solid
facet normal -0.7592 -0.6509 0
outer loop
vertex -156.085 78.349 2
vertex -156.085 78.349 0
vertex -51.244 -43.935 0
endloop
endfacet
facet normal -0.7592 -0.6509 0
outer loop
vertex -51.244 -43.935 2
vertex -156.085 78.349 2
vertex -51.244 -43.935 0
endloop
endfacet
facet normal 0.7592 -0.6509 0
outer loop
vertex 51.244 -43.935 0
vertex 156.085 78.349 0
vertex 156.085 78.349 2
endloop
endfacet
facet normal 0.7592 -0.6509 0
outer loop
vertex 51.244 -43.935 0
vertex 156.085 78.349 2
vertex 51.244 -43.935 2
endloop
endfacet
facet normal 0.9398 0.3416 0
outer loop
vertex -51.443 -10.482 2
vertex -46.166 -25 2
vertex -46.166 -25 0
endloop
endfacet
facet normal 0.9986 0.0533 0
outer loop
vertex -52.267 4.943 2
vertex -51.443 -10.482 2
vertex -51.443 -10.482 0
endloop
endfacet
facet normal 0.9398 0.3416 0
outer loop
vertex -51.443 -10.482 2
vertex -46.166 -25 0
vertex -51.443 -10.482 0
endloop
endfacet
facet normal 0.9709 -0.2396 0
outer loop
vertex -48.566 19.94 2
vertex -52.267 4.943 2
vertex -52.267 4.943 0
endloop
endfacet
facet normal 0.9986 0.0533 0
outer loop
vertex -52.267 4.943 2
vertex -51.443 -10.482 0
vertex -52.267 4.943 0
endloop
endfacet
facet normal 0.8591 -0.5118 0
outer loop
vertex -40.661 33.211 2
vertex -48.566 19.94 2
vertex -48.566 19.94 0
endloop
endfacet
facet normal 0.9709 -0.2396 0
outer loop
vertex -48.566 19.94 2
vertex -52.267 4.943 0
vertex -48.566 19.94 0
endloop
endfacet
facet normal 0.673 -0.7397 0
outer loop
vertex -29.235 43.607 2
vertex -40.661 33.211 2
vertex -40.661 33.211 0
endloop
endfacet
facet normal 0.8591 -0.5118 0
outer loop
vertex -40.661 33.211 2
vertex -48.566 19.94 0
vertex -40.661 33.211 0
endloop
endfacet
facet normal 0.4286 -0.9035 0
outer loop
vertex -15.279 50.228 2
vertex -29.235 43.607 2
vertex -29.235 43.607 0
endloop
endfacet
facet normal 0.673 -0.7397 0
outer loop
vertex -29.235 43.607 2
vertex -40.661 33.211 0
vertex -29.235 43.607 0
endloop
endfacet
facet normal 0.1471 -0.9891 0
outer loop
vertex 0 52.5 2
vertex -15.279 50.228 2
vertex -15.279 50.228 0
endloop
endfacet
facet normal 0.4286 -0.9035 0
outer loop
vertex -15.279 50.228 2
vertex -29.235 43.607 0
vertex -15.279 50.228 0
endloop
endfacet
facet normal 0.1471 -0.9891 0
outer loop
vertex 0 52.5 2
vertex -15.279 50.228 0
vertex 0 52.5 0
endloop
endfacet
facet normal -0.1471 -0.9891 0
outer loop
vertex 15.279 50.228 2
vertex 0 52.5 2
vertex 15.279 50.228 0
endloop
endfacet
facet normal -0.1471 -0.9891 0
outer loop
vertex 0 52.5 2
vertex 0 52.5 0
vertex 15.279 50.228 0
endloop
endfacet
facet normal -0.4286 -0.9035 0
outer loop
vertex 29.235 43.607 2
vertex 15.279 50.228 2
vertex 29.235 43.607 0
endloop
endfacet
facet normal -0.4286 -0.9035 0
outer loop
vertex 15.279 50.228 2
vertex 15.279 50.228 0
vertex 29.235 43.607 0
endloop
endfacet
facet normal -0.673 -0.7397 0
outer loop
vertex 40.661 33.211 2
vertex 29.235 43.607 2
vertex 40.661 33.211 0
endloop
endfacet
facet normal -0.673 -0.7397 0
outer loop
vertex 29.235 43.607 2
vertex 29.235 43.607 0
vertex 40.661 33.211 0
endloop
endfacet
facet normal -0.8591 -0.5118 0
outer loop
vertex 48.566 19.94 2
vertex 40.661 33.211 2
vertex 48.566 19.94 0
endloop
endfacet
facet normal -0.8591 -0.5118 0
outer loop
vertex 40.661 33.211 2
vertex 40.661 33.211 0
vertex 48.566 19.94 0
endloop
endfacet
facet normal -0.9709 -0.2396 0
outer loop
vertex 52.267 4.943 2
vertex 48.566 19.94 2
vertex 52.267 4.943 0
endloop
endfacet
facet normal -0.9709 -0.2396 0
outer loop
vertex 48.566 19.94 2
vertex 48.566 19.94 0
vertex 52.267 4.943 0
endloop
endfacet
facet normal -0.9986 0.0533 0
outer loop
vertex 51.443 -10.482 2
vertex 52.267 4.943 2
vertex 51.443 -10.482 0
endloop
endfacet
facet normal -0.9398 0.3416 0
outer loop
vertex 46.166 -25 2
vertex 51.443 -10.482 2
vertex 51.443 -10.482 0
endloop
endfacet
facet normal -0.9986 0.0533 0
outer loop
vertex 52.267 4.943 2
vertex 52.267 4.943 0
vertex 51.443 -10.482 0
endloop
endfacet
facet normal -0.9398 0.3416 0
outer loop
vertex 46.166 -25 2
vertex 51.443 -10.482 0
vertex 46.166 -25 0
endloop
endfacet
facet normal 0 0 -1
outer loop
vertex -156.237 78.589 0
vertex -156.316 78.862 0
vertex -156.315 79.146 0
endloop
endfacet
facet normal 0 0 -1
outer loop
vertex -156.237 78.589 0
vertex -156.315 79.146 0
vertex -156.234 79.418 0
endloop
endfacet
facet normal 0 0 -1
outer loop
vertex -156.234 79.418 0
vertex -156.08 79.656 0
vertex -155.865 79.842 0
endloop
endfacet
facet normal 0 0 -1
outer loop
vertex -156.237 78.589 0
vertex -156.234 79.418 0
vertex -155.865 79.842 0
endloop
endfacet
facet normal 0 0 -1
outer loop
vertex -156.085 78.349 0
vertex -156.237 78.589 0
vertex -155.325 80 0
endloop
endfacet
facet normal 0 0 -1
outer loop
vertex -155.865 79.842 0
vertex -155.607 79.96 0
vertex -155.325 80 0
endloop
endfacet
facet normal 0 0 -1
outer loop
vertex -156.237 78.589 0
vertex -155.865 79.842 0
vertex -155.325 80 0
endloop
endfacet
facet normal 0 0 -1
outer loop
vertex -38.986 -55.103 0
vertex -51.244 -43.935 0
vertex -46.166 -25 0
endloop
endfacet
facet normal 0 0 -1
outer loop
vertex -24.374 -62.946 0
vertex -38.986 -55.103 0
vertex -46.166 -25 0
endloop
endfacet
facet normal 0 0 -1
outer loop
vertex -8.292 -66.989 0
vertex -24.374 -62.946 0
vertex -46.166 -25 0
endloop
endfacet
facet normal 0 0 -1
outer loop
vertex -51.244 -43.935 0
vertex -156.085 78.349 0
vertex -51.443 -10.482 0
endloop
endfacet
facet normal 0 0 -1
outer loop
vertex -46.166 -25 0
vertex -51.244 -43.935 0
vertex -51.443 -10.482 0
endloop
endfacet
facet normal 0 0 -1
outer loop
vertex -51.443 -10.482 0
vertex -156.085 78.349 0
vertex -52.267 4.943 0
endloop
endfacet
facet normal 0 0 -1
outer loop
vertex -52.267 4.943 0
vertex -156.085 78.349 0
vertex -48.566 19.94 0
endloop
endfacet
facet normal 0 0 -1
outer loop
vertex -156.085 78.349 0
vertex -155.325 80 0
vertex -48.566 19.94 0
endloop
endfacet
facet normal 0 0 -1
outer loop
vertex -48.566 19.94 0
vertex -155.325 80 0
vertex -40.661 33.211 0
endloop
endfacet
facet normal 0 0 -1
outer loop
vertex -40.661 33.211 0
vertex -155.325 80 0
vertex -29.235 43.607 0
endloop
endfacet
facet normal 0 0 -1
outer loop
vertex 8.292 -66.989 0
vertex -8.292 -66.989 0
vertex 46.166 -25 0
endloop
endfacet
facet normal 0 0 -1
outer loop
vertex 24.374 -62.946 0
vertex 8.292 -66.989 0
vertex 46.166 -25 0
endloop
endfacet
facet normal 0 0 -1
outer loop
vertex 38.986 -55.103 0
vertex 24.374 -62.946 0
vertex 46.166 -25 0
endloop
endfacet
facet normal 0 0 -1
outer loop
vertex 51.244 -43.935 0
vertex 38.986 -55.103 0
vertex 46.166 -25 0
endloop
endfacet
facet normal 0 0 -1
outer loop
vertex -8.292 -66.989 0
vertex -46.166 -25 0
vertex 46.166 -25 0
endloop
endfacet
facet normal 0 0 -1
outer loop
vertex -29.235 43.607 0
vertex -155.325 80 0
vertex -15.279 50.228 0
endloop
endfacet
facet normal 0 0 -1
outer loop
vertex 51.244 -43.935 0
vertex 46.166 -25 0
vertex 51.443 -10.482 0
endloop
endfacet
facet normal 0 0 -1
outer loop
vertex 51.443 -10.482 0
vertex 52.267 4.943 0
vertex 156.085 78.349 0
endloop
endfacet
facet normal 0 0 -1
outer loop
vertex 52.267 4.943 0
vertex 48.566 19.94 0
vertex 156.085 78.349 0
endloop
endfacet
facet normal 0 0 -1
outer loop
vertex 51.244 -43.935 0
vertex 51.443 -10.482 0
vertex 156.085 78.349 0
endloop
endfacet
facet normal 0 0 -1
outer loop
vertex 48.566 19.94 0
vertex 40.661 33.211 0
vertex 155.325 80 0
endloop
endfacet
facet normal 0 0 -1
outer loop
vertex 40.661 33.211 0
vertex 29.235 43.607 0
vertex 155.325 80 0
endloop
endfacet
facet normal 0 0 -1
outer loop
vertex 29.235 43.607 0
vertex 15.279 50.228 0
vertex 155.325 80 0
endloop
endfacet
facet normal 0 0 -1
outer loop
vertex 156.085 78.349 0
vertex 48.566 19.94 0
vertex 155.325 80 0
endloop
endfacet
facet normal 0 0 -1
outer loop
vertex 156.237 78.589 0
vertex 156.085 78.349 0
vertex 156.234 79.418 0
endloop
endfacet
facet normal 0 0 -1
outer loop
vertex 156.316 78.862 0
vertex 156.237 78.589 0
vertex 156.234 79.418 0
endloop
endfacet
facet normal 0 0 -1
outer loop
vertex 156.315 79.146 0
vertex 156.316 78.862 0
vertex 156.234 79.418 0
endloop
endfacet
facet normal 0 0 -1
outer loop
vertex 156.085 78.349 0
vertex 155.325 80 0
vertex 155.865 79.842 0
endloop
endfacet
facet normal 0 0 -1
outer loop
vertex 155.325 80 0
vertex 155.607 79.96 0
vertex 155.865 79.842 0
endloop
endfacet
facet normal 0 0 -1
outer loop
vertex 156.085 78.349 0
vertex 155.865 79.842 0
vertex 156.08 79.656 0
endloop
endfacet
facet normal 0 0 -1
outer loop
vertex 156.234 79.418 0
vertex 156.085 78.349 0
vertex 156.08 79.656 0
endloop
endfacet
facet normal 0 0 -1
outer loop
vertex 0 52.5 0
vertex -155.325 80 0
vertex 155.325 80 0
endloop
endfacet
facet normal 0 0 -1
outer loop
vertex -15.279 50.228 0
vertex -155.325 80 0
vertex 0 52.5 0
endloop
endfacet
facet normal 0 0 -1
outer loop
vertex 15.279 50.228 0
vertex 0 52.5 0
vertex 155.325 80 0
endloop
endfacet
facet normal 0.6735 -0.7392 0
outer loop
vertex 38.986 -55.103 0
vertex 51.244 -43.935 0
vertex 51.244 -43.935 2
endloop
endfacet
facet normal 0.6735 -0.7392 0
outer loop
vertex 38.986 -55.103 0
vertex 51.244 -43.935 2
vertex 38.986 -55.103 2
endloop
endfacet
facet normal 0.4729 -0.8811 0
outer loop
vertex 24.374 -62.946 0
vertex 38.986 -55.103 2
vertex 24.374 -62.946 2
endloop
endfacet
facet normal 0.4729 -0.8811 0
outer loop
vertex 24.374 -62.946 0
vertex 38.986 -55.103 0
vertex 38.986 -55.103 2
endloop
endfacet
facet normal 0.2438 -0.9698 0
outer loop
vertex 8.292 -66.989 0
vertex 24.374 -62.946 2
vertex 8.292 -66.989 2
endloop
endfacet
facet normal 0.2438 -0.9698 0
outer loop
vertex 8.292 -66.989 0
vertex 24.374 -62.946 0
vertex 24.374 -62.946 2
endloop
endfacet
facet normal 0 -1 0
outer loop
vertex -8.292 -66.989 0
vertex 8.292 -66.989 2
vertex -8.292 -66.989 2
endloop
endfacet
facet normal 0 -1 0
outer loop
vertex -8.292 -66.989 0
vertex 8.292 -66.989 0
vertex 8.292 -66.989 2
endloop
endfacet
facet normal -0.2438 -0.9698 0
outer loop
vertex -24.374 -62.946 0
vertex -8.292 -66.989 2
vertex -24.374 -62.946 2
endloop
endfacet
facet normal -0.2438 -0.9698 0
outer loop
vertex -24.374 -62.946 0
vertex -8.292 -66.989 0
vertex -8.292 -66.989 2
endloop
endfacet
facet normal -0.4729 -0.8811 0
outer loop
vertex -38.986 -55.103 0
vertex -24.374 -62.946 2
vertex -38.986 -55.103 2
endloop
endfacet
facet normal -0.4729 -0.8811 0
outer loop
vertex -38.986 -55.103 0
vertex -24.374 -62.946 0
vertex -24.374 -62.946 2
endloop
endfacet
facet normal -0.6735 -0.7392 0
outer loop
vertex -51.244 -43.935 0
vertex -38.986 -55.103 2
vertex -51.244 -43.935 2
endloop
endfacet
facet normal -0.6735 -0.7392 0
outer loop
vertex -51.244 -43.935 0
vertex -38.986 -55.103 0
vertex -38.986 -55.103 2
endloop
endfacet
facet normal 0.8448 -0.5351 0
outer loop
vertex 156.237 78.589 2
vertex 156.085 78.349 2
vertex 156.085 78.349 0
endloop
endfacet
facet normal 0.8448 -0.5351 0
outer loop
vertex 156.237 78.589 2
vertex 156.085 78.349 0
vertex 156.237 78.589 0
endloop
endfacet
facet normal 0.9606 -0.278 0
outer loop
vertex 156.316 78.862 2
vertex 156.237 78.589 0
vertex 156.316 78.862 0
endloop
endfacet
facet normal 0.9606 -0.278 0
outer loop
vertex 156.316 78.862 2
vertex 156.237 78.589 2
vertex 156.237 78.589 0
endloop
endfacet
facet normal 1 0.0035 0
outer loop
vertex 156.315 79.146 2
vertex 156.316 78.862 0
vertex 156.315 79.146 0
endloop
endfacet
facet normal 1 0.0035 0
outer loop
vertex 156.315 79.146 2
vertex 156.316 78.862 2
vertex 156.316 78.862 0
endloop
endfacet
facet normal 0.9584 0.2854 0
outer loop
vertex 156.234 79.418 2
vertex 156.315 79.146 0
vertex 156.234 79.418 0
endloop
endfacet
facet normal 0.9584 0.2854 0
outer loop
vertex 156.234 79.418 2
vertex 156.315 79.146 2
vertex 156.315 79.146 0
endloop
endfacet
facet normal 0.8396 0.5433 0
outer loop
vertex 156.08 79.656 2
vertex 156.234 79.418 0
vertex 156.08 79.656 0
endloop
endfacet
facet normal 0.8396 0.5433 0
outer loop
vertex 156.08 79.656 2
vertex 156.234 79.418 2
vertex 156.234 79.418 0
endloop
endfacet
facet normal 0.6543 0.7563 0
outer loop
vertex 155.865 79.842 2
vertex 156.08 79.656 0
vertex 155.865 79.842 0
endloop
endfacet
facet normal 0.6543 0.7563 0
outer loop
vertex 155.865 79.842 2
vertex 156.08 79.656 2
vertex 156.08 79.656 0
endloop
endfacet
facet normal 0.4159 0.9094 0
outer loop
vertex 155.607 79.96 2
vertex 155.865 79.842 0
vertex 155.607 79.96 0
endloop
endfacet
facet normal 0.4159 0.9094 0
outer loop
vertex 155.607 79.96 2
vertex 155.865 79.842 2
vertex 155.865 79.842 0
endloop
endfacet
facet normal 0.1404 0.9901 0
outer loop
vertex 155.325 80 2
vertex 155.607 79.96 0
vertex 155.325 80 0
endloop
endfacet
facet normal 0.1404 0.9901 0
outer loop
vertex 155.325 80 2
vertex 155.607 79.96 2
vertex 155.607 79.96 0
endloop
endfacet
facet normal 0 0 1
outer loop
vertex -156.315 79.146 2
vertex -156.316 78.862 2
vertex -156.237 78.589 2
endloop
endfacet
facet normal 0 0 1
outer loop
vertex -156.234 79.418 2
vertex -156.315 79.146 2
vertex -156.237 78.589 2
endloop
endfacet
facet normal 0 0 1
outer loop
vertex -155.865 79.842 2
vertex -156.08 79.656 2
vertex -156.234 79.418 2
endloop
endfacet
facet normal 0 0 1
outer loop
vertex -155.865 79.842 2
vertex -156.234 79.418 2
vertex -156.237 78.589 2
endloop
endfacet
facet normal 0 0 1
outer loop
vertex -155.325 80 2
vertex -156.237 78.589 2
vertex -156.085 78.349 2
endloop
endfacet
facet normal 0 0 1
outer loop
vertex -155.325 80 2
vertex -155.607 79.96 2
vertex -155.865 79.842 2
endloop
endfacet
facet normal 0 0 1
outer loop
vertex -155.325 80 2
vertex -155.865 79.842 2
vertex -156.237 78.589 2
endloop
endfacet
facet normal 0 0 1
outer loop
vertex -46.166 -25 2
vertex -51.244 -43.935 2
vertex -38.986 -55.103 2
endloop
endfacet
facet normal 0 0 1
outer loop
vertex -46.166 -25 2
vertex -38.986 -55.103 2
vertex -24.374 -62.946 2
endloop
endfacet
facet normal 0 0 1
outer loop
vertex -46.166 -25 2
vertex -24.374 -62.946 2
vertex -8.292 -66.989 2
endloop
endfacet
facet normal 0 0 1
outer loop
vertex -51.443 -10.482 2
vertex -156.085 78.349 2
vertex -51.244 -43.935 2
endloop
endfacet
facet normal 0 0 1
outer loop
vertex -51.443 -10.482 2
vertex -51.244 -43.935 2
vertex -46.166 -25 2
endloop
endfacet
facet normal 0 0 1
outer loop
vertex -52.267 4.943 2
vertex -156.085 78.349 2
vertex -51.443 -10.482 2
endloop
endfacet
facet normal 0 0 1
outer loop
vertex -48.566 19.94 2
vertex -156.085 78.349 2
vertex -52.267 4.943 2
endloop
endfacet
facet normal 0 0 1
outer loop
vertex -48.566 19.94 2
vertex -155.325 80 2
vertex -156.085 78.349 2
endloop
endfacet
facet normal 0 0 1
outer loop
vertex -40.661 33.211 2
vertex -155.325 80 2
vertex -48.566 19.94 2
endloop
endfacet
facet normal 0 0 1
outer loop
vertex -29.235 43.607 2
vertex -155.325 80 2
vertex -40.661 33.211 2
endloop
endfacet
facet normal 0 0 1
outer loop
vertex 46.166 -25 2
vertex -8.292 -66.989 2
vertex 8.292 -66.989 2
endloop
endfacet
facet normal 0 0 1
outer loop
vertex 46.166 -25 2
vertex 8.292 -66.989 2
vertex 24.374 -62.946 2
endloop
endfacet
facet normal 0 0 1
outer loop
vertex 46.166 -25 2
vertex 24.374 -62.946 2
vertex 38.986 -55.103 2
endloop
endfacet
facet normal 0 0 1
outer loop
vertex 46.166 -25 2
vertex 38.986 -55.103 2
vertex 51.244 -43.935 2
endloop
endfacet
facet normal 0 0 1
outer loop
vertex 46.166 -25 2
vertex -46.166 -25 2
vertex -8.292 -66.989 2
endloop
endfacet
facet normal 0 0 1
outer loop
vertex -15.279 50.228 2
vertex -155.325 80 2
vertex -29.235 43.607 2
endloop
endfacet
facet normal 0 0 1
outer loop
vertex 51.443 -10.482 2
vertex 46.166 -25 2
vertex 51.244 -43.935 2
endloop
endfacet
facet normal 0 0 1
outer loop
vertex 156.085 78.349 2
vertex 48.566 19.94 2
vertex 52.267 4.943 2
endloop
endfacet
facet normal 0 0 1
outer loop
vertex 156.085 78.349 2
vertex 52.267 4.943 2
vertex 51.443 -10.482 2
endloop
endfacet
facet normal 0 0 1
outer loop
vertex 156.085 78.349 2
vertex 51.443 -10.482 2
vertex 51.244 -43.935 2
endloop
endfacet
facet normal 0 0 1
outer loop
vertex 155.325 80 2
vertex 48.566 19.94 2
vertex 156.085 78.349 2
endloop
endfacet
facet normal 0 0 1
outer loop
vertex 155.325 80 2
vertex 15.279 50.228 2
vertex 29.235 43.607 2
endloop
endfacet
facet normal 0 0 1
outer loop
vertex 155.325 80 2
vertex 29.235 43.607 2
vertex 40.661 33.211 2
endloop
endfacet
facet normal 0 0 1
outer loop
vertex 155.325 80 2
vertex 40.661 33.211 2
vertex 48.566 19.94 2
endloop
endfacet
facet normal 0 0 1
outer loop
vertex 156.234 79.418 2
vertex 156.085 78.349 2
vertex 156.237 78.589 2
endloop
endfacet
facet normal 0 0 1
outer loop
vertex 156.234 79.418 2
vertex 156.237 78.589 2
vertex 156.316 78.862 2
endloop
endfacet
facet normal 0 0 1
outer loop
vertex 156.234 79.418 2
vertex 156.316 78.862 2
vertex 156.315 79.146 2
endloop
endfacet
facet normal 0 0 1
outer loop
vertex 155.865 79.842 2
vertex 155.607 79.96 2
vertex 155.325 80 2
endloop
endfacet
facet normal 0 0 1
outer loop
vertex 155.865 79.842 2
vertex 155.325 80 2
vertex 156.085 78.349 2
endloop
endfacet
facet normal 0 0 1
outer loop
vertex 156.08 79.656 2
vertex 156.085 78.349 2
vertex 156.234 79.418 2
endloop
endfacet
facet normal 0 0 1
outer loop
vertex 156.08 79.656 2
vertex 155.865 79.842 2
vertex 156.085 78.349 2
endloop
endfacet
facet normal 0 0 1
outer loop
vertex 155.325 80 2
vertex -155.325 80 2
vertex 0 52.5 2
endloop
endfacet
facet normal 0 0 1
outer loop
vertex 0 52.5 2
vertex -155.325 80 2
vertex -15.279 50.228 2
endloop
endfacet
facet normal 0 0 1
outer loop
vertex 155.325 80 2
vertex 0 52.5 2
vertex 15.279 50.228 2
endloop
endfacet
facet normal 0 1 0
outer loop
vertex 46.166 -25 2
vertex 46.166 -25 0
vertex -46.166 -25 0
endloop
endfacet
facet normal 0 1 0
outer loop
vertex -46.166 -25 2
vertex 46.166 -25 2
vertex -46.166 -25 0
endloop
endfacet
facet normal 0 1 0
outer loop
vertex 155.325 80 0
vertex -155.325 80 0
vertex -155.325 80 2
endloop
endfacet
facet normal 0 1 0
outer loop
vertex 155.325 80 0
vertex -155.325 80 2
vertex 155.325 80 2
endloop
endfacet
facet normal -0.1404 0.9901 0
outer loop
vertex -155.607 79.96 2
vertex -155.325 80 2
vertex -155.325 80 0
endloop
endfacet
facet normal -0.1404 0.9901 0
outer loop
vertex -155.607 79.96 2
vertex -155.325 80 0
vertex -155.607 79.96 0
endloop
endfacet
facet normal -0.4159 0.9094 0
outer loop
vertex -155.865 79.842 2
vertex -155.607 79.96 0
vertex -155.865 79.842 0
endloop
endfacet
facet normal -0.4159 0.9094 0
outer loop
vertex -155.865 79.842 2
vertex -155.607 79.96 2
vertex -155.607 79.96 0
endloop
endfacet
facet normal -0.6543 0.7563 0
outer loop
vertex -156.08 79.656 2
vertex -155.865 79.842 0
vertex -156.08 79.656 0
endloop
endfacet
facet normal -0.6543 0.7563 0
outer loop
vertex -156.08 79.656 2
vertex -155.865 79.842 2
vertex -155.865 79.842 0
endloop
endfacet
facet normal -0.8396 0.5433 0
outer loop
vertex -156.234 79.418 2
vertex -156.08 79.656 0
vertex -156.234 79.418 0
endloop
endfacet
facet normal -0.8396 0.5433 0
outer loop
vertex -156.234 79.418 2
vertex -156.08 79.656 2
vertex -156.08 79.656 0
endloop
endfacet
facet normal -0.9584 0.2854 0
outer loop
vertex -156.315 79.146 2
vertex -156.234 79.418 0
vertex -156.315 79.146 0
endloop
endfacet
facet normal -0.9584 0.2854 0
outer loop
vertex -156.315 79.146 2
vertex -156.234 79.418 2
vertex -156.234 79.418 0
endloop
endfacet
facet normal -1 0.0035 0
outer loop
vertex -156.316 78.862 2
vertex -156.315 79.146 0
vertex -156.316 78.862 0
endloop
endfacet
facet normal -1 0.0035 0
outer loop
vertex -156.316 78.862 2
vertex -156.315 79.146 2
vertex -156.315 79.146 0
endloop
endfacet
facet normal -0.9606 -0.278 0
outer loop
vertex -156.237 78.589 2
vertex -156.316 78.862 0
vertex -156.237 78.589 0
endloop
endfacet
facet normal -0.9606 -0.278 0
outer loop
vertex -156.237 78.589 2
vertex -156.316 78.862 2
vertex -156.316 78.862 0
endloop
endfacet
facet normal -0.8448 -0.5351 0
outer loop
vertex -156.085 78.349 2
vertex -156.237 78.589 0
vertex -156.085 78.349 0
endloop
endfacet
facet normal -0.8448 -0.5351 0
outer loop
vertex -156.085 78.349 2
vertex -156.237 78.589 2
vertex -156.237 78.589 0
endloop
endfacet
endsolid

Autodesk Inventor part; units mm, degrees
ref_plane "YZ Plane" through (0, 0, 0) normal (1, 0, 0) x (0, 1, 0)
ref_plane "XZ Plane" through (0, 0, 0) normal (0, 1, 0) x (-1, 0, 0)
ref_plane "XY Plane" through (0, 0, 0) normal (0, 0, 1) x (1, 0, 0)
sketch "Sketch2" plane through (0, 0, 0) normal (0, 0, 1) x (1, 0, 0)
  circle A0 centre (0, 0) radius 67.5
  line L0 (-157.5, 80) -> (-51.2445, -43.9346)
  line L1 (157.5, 80) -> (51.2445, -43.9346)
  line L2 (-157.5, 80) -> (157.5, 80)
  circle A1 centre (0, 0) radius 52.5
  line L3 (46.1655, -25) -> (-46.1655, -25)
  point P0 (0, 80)
  dimension "d11" = 135
  dimension "d12" = 15
  dimension "d13" = 315
  dimension "d14" = 80
  dimension "d15" = 25
extrude "Plate2" add sketch "Sketch2" along normal blind 2 contours A0 | A0 L0 L2 L1 | L3 A1 picked at (-3.1172, -43.6181)
fillet "Corner Round1" radius 1 2 edges at (157.5, 80, 1) (-157.5, 80, 1)
equation "\"d10\" = Thickness"
equation "\"BendRadius\" = Thickness"
equation "\"BendReliefWidth\" = Thickness"
equation "\"BendReliefDepth\" = 0.5 * Thickness"
equation "\"CornerReliefSize\" = 4 * Thickness"
equation "\"MinimumRemnant\" = 2 * Thickness"
equation "\"TransitionRadius\" = BendRadius"
equation "\"JacobiRadiusSize\" = BendRadius"
equation "\"GapSize\" = Thickness"
equation "\"Thickness\" = 2"
properties part number "ДМФ 054 фланец лотка v2.0"
